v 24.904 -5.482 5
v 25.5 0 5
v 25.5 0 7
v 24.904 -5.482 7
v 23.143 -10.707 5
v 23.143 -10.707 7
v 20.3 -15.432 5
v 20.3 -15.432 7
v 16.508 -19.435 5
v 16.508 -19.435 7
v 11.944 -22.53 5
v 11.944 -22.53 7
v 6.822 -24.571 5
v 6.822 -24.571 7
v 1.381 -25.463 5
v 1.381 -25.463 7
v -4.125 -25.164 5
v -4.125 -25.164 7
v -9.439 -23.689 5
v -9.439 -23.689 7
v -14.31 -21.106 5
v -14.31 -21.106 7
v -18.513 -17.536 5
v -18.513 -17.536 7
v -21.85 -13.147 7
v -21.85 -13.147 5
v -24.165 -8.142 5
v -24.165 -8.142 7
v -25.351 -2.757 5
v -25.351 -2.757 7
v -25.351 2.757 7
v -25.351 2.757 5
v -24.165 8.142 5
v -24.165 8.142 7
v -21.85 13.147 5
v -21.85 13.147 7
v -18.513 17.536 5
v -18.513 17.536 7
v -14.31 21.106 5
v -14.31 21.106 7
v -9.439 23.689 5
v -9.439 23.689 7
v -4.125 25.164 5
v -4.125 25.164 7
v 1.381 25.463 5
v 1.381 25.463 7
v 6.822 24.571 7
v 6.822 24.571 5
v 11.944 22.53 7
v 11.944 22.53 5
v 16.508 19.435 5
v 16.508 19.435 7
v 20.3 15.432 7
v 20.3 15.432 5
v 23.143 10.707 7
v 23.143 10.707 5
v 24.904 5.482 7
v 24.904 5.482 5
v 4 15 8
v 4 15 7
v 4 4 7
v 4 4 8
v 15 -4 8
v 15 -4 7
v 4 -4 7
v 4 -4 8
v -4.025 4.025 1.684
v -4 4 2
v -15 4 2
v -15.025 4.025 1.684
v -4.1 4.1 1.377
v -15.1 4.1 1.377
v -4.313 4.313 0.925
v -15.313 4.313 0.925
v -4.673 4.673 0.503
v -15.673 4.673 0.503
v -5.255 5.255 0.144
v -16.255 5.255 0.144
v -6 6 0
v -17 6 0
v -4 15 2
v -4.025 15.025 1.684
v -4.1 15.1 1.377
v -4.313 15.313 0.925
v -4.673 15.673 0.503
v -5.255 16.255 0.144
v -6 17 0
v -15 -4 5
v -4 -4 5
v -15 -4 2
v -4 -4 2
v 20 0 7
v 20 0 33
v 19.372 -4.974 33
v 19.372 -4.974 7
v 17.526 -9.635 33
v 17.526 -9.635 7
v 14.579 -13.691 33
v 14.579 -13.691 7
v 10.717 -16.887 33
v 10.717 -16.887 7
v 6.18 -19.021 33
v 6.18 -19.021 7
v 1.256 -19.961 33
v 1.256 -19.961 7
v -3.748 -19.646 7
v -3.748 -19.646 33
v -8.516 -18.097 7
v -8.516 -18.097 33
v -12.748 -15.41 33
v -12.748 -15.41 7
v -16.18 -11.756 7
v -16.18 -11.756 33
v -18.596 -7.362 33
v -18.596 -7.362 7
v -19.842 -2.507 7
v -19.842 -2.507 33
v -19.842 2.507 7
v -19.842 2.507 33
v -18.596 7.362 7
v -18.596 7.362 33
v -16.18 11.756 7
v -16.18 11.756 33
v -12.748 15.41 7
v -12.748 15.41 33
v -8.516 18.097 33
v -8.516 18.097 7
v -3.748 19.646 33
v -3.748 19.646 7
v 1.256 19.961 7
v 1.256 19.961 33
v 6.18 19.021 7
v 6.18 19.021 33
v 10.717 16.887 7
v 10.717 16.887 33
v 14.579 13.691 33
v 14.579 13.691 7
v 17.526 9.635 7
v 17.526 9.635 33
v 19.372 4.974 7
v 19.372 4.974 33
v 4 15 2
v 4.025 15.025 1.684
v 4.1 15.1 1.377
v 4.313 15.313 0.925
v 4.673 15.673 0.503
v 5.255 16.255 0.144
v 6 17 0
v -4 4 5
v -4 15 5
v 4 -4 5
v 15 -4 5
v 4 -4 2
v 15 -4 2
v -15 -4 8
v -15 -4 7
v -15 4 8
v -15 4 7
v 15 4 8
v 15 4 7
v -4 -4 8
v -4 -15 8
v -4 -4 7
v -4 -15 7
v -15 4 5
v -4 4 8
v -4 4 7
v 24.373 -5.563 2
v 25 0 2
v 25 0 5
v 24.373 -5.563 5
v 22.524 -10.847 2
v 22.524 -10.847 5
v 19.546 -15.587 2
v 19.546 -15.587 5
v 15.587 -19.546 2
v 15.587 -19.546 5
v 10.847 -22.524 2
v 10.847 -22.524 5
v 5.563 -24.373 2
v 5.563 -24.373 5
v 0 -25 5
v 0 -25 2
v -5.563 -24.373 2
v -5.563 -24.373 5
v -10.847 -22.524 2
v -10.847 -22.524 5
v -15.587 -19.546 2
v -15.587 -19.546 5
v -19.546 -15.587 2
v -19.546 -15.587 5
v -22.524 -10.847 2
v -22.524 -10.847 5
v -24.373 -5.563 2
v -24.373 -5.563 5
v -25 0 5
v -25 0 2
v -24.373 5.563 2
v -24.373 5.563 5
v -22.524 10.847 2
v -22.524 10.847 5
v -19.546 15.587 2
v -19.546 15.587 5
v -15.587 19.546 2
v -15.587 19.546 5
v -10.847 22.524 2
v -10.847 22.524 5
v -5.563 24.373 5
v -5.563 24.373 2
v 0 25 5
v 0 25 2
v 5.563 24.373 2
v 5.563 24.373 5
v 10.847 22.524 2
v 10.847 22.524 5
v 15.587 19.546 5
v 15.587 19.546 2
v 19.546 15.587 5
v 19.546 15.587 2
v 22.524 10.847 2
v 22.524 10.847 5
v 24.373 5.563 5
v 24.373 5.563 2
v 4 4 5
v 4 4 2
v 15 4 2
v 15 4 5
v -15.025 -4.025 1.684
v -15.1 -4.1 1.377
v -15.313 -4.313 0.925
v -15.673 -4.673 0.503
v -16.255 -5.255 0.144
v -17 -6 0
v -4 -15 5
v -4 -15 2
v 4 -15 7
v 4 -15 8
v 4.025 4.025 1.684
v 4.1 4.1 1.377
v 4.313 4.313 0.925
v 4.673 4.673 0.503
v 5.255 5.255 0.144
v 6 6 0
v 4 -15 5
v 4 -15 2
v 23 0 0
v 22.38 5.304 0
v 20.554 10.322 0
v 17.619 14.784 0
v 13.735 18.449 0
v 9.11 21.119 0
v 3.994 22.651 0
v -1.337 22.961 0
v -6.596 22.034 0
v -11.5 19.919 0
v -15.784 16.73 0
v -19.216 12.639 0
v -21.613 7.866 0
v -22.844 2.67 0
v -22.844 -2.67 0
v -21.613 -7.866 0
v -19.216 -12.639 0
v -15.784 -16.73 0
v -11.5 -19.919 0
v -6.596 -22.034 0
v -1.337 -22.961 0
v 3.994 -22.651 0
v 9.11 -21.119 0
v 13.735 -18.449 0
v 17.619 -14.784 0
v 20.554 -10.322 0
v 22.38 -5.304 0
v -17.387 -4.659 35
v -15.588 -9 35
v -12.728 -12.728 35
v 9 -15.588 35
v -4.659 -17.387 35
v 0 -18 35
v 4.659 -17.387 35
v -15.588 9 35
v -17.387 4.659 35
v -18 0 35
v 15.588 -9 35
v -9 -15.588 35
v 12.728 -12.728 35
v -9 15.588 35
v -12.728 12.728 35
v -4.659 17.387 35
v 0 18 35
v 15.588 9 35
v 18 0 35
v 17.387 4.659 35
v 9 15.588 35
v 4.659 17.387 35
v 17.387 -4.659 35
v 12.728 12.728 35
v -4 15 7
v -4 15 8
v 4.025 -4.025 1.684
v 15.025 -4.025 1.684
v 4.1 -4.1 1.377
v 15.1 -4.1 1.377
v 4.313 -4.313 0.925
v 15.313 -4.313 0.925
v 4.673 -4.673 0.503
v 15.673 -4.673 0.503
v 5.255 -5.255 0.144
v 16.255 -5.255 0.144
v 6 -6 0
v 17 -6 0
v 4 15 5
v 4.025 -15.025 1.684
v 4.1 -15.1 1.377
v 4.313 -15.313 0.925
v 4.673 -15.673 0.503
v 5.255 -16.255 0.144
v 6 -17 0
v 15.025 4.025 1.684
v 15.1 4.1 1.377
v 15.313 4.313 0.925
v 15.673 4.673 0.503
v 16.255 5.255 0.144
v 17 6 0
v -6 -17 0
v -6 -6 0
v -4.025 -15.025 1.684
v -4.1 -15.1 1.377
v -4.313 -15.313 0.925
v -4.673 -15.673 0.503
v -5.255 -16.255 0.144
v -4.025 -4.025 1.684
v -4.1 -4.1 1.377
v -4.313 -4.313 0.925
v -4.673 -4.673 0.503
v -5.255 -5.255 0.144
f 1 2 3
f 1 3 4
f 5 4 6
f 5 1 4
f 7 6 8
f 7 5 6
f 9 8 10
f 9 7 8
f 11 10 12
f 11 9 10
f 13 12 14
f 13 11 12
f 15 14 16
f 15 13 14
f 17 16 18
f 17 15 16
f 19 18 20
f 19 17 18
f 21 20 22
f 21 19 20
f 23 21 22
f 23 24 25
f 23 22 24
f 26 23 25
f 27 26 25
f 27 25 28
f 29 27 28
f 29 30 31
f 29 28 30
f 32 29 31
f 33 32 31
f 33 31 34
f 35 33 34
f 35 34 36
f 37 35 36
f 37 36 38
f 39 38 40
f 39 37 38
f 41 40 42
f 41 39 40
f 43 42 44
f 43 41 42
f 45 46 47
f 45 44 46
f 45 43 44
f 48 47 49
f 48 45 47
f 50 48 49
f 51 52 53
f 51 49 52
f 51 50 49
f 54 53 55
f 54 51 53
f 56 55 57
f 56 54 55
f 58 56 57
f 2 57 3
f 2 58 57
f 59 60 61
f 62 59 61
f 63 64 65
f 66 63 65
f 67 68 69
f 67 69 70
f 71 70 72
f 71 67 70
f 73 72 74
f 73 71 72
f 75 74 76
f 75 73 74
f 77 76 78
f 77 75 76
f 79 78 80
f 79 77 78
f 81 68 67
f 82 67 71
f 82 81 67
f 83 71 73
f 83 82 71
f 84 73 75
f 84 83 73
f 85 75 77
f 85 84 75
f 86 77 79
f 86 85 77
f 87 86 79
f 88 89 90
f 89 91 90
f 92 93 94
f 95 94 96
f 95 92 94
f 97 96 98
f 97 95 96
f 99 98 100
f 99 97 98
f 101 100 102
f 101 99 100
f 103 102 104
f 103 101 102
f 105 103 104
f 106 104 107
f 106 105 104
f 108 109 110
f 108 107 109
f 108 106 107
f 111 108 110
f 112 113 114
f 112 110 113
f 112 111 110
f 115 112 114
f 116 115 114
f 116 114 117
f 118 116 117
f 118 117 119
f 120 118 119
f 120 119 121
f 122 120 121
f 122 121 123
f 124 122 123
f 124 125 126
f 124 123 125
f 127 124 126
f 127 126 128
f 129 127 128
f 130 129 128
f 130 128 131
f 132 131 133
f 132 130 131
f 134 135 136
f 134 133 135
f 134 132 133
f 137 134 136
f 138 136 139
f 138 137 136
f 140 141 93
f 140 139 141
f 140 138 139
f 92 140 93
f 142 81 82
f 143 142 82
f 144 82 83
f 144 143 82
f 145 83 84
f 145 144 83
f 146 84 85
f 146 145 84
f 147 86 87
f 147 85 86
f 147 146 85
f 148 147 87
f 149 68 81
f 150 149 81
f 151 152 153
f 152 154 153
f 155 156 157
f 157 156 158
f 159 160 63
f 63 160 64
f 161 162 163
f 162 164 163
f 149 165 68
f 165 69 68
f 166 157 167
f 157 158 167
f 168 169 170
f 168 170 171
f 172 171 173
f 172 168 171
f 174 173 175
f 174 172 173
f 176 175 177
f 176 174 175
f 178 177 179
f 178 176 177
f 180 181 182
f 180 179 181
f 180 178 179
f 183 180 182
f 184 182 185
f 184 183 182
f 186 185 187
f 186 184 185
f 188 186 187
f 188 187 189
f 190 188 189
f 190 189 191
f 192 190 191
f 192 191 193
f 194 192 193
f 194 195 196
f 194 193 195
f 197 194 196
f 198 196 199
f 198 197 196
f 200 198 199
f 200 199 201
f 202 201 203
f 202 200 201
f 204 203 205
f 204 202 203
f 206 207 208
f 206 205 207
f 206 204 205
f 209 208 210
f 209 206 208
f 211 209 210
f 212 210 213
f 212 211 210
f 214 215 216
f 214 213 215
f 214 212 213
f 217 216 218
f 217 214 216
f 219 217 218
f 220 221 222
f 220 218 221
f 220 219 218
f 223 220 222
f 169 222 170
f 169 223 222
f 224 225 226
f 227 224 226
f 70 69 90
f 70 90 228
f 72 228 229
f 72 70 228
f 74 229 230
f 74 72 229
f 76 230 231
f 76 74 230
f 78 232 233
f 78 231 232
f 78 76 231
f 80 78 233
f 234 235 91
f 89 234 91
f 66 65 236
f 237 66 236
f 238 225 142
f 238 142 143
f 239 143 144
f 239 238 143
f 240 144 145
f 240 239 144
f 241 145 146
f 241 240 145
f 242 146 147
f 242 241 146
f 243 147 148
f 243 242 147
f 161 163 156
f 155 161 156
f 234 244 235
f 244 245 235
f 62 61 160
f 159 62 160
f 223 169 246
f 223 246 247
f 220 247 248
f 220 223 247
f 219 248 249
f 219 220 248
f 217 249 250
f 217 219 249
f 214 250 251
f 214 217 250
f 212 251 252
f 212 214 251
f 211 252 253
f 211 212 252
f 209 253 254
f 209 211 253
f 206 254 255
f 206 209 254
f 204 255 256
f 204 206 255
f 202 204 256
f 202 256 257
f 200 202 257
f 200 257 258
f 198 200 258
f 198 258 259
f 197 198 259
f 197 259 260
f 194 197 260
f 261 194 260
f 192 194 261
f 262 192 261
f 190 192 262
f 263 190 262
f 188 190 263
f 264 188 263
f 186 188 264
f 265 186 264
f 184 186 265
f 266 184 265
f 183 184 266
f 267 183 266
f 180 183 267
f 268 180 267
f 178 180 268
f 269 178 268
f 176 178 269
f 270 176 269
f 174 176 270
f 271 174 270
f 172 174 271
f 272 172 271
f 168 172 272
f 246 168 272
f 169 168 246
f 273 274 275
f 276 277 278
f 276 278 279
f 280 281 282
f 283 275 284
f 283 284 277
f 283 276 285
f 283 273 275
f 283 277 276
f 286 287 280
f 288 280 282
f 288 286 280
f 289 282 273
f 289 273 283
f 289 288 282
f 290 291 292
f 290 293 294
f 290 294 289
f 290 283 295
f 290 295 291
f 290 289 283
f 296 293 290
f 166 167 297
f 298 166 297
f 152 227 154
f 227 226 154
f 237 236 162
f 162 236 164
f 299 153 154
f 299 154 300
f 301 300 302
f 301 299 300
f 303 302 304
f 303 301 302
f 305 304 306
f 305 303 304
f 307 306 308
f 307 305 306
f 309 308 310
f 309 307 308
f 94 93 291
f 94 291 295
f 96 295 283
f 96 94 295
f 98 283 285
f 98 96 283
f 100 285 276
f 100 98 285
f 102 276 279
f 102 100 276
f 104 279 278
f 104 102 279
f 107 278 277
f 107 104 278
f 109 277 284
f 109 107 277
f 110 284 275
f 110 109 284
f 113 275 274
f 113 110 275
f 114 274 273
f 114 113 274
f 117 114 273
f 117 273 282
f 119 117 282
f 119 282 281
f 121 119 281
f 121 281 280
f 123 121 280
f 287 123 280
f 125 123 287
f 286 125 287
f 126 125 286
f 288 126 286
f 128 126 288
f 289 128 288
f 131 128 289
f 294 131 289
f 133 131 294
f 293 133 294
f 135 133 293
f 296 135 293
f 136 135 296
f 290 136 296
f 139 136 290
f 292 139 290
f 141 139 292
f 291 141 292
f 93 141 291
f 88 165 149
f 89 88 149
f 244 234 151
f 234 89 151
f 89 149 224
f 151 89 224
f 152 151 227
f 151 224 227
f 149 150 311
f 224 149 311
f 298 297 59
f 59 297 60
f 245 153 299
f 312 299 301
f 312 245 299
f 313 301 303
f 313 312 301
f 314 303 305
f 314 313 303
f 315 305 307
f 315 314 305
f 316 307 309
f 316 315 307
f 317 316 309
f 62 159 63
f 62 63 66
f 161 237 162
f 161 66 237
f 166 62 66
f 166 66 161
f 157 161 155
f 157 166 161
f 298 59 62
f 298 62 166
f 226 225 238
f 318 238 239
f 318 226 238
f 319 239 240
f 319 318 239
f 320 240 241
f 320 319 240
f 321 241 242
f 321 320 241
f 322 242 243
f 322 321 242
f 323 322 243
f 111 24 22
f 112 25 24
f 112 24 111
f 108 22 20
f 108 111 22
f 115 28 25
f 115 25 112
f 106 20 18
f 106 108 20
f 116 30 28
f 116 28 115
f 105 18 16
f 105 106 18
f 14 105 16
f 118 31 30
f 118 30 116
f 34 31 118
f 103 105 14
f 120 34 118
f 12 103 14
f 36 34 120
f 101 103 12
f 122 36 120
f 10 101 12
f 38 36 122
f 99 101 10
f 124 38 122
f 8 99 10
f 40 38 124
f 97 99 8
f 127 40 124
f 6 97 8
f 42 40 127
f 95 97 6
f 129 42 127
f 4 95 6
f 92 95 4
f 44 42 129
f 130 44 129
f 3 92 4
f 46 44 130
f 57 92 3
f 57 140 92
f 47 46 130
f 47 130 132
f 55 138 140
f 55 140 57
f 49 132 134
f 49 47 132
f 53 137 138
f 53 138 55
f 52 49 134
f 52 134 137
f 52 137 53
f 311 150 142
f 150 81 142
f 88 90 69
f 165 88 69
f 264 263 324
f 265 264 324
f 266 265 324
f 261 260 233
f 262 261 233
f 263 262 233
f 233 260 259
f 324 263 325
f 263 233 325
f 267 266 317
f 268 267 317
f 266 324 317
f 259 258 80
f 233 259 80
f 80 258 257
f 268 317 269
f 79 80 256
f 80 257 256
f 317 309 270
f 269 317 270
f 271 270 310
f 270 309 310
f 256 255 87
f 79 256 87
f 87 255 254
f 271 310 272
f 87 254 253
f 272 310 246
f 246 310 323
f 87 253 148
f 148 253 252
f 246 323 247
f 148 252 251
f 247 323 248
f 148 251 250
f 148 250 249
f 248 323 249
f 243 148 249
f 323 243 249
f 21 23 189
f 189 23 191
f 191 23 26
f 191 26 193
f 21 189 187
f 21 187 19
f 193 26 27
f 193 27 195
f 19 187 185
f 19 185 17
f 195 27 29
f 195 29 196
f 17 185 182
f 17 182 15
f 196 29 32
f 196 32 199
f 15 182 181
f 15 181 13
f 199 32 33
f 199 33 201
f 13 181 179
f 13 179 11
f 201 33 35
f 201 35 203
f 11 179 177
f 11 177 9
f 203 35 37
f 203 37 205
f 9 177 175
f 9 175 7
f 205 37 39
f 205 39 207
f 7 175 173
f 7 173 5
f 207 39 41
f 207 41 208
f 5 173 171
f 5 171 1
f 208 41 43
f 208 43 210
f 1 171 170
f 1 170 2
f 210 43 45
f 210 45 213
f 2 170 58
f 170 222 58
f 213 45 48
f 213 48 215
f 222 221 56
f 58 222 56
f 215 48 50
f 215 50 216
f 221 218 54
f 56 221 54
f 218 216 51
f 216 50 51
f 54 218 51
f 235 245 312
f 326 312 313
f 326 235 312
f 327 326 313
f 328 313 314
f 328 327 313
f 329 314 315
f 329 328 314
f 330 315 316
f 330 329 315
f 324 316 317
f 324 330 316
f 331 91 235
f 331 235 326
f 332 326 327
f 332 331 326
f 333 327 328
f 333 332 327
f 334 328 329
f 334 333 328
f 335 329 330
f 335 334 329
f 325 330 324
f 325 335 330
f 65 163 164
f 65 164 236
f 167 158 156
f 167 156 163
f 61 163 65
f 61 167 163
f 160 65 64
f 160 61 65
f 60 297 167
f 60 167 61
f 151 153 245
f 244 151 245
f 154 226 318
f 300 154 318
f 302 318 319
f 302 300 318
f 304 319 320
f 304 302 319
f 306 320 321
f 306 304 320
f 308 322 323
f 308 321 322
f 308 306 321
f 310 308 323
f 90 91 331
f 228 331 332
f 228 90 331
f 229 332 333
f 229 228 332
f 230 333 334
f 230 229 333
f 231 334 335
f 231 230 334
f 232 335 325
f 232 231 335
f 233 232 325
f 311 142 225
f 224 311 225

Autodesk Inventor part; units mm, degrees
ref_plane "YZ Plane" through (0, 0, 0) normal (1, 0, 0) x (0, 1, 0)
ref_plane "XZ Plane" through (0, 0, 0) normal (0, 1, 0) x (-1, 0, 0)
ref_plane "XY Plane" through (0, 0, 0) normal (0, 0, 1) x (1, 0, 0)
sketch "Skizze1" plane through (0, 0, 0) normal (0, 0, 1) x (1, 0, 0)
  circle A0 centre (0, 0) radius 25
  dimension "d0" = 50
extrude "Extrusion1" add sketch "Skizze1" along normal blind 5
sketch "Skizze2" plane through (0, 0, 5) normal (0, 0, 1) x (1, 0, 0)
  circle A0 centre (0, 0) radius 20
  dimension "d3" = 40
extrude "Extrusion2" add sketch "Skizze2" along normal blind 30
thread "Gewinde1" size "M40x3" class "6g" standard "ISO Metric profile" full length
chamfer "Fase1" distance 2 angle 45 2 edges at (-20, 0, 35) (-25, 0, 0)
sketch "Skizze3" plane through (0, 0, 0) normal (0, 0, -1) x (-1, 0, 0)
  line L0 (-15, -4) -> (15, -4)
  line L1 (15, -4) -> (15, 4)
  line L2 (15, 4) -> (-15, 4)
  line L3 (-15, 4) -> (-15, -4)
  line L4 (-15, -4) -> (15, 4) construction
  line L5 (15, -4) -> (-15, 4) construction
  line L6 (-4, -15) -> (4, -15)
  line L7 (4, -15) -> (4, 15)
  line L8 (4, 15) -> (-4, 15)
  line L9 (-4, 15) -> (-4, -15)
  line L10 (-4, -15) -> (4, 15) construction
  line L11 (4, -15) -> (-4, 15) construction
  point P0 (0, 0)
  dimension "d11" = 30
  dimension "d12" = 30
  dimension "d13" = 8
  dimension "d14" = 8
extrude "Extrusion3" cut sketch "Skizze3" against normal blind 8
fillet "Rundung1" radius 2 12 edges at (-4, 9.5, 0) (0, 15, 0) (4, 9.5, 0) (9.5, 4, 0) (15, 0, 0) (9.5, -4, 0) (4, -9.5, 0) (-4, -9.5, 0) (0, -15, 0) (-9.5, -4, 0) (-15, 0, 0) (-9.5, 4, 0)
sketch "Skizze4" plane through (0, 0, 5) normal (0, 0, 1) x (1, 0, 0)
  circle A0 centre (0, 0) radius 25.5
  dimension "d18" = 51
extrude "Extrusion4" add sketch "Skizze4" along normal blind 2
properties part number "Flutschraube"
